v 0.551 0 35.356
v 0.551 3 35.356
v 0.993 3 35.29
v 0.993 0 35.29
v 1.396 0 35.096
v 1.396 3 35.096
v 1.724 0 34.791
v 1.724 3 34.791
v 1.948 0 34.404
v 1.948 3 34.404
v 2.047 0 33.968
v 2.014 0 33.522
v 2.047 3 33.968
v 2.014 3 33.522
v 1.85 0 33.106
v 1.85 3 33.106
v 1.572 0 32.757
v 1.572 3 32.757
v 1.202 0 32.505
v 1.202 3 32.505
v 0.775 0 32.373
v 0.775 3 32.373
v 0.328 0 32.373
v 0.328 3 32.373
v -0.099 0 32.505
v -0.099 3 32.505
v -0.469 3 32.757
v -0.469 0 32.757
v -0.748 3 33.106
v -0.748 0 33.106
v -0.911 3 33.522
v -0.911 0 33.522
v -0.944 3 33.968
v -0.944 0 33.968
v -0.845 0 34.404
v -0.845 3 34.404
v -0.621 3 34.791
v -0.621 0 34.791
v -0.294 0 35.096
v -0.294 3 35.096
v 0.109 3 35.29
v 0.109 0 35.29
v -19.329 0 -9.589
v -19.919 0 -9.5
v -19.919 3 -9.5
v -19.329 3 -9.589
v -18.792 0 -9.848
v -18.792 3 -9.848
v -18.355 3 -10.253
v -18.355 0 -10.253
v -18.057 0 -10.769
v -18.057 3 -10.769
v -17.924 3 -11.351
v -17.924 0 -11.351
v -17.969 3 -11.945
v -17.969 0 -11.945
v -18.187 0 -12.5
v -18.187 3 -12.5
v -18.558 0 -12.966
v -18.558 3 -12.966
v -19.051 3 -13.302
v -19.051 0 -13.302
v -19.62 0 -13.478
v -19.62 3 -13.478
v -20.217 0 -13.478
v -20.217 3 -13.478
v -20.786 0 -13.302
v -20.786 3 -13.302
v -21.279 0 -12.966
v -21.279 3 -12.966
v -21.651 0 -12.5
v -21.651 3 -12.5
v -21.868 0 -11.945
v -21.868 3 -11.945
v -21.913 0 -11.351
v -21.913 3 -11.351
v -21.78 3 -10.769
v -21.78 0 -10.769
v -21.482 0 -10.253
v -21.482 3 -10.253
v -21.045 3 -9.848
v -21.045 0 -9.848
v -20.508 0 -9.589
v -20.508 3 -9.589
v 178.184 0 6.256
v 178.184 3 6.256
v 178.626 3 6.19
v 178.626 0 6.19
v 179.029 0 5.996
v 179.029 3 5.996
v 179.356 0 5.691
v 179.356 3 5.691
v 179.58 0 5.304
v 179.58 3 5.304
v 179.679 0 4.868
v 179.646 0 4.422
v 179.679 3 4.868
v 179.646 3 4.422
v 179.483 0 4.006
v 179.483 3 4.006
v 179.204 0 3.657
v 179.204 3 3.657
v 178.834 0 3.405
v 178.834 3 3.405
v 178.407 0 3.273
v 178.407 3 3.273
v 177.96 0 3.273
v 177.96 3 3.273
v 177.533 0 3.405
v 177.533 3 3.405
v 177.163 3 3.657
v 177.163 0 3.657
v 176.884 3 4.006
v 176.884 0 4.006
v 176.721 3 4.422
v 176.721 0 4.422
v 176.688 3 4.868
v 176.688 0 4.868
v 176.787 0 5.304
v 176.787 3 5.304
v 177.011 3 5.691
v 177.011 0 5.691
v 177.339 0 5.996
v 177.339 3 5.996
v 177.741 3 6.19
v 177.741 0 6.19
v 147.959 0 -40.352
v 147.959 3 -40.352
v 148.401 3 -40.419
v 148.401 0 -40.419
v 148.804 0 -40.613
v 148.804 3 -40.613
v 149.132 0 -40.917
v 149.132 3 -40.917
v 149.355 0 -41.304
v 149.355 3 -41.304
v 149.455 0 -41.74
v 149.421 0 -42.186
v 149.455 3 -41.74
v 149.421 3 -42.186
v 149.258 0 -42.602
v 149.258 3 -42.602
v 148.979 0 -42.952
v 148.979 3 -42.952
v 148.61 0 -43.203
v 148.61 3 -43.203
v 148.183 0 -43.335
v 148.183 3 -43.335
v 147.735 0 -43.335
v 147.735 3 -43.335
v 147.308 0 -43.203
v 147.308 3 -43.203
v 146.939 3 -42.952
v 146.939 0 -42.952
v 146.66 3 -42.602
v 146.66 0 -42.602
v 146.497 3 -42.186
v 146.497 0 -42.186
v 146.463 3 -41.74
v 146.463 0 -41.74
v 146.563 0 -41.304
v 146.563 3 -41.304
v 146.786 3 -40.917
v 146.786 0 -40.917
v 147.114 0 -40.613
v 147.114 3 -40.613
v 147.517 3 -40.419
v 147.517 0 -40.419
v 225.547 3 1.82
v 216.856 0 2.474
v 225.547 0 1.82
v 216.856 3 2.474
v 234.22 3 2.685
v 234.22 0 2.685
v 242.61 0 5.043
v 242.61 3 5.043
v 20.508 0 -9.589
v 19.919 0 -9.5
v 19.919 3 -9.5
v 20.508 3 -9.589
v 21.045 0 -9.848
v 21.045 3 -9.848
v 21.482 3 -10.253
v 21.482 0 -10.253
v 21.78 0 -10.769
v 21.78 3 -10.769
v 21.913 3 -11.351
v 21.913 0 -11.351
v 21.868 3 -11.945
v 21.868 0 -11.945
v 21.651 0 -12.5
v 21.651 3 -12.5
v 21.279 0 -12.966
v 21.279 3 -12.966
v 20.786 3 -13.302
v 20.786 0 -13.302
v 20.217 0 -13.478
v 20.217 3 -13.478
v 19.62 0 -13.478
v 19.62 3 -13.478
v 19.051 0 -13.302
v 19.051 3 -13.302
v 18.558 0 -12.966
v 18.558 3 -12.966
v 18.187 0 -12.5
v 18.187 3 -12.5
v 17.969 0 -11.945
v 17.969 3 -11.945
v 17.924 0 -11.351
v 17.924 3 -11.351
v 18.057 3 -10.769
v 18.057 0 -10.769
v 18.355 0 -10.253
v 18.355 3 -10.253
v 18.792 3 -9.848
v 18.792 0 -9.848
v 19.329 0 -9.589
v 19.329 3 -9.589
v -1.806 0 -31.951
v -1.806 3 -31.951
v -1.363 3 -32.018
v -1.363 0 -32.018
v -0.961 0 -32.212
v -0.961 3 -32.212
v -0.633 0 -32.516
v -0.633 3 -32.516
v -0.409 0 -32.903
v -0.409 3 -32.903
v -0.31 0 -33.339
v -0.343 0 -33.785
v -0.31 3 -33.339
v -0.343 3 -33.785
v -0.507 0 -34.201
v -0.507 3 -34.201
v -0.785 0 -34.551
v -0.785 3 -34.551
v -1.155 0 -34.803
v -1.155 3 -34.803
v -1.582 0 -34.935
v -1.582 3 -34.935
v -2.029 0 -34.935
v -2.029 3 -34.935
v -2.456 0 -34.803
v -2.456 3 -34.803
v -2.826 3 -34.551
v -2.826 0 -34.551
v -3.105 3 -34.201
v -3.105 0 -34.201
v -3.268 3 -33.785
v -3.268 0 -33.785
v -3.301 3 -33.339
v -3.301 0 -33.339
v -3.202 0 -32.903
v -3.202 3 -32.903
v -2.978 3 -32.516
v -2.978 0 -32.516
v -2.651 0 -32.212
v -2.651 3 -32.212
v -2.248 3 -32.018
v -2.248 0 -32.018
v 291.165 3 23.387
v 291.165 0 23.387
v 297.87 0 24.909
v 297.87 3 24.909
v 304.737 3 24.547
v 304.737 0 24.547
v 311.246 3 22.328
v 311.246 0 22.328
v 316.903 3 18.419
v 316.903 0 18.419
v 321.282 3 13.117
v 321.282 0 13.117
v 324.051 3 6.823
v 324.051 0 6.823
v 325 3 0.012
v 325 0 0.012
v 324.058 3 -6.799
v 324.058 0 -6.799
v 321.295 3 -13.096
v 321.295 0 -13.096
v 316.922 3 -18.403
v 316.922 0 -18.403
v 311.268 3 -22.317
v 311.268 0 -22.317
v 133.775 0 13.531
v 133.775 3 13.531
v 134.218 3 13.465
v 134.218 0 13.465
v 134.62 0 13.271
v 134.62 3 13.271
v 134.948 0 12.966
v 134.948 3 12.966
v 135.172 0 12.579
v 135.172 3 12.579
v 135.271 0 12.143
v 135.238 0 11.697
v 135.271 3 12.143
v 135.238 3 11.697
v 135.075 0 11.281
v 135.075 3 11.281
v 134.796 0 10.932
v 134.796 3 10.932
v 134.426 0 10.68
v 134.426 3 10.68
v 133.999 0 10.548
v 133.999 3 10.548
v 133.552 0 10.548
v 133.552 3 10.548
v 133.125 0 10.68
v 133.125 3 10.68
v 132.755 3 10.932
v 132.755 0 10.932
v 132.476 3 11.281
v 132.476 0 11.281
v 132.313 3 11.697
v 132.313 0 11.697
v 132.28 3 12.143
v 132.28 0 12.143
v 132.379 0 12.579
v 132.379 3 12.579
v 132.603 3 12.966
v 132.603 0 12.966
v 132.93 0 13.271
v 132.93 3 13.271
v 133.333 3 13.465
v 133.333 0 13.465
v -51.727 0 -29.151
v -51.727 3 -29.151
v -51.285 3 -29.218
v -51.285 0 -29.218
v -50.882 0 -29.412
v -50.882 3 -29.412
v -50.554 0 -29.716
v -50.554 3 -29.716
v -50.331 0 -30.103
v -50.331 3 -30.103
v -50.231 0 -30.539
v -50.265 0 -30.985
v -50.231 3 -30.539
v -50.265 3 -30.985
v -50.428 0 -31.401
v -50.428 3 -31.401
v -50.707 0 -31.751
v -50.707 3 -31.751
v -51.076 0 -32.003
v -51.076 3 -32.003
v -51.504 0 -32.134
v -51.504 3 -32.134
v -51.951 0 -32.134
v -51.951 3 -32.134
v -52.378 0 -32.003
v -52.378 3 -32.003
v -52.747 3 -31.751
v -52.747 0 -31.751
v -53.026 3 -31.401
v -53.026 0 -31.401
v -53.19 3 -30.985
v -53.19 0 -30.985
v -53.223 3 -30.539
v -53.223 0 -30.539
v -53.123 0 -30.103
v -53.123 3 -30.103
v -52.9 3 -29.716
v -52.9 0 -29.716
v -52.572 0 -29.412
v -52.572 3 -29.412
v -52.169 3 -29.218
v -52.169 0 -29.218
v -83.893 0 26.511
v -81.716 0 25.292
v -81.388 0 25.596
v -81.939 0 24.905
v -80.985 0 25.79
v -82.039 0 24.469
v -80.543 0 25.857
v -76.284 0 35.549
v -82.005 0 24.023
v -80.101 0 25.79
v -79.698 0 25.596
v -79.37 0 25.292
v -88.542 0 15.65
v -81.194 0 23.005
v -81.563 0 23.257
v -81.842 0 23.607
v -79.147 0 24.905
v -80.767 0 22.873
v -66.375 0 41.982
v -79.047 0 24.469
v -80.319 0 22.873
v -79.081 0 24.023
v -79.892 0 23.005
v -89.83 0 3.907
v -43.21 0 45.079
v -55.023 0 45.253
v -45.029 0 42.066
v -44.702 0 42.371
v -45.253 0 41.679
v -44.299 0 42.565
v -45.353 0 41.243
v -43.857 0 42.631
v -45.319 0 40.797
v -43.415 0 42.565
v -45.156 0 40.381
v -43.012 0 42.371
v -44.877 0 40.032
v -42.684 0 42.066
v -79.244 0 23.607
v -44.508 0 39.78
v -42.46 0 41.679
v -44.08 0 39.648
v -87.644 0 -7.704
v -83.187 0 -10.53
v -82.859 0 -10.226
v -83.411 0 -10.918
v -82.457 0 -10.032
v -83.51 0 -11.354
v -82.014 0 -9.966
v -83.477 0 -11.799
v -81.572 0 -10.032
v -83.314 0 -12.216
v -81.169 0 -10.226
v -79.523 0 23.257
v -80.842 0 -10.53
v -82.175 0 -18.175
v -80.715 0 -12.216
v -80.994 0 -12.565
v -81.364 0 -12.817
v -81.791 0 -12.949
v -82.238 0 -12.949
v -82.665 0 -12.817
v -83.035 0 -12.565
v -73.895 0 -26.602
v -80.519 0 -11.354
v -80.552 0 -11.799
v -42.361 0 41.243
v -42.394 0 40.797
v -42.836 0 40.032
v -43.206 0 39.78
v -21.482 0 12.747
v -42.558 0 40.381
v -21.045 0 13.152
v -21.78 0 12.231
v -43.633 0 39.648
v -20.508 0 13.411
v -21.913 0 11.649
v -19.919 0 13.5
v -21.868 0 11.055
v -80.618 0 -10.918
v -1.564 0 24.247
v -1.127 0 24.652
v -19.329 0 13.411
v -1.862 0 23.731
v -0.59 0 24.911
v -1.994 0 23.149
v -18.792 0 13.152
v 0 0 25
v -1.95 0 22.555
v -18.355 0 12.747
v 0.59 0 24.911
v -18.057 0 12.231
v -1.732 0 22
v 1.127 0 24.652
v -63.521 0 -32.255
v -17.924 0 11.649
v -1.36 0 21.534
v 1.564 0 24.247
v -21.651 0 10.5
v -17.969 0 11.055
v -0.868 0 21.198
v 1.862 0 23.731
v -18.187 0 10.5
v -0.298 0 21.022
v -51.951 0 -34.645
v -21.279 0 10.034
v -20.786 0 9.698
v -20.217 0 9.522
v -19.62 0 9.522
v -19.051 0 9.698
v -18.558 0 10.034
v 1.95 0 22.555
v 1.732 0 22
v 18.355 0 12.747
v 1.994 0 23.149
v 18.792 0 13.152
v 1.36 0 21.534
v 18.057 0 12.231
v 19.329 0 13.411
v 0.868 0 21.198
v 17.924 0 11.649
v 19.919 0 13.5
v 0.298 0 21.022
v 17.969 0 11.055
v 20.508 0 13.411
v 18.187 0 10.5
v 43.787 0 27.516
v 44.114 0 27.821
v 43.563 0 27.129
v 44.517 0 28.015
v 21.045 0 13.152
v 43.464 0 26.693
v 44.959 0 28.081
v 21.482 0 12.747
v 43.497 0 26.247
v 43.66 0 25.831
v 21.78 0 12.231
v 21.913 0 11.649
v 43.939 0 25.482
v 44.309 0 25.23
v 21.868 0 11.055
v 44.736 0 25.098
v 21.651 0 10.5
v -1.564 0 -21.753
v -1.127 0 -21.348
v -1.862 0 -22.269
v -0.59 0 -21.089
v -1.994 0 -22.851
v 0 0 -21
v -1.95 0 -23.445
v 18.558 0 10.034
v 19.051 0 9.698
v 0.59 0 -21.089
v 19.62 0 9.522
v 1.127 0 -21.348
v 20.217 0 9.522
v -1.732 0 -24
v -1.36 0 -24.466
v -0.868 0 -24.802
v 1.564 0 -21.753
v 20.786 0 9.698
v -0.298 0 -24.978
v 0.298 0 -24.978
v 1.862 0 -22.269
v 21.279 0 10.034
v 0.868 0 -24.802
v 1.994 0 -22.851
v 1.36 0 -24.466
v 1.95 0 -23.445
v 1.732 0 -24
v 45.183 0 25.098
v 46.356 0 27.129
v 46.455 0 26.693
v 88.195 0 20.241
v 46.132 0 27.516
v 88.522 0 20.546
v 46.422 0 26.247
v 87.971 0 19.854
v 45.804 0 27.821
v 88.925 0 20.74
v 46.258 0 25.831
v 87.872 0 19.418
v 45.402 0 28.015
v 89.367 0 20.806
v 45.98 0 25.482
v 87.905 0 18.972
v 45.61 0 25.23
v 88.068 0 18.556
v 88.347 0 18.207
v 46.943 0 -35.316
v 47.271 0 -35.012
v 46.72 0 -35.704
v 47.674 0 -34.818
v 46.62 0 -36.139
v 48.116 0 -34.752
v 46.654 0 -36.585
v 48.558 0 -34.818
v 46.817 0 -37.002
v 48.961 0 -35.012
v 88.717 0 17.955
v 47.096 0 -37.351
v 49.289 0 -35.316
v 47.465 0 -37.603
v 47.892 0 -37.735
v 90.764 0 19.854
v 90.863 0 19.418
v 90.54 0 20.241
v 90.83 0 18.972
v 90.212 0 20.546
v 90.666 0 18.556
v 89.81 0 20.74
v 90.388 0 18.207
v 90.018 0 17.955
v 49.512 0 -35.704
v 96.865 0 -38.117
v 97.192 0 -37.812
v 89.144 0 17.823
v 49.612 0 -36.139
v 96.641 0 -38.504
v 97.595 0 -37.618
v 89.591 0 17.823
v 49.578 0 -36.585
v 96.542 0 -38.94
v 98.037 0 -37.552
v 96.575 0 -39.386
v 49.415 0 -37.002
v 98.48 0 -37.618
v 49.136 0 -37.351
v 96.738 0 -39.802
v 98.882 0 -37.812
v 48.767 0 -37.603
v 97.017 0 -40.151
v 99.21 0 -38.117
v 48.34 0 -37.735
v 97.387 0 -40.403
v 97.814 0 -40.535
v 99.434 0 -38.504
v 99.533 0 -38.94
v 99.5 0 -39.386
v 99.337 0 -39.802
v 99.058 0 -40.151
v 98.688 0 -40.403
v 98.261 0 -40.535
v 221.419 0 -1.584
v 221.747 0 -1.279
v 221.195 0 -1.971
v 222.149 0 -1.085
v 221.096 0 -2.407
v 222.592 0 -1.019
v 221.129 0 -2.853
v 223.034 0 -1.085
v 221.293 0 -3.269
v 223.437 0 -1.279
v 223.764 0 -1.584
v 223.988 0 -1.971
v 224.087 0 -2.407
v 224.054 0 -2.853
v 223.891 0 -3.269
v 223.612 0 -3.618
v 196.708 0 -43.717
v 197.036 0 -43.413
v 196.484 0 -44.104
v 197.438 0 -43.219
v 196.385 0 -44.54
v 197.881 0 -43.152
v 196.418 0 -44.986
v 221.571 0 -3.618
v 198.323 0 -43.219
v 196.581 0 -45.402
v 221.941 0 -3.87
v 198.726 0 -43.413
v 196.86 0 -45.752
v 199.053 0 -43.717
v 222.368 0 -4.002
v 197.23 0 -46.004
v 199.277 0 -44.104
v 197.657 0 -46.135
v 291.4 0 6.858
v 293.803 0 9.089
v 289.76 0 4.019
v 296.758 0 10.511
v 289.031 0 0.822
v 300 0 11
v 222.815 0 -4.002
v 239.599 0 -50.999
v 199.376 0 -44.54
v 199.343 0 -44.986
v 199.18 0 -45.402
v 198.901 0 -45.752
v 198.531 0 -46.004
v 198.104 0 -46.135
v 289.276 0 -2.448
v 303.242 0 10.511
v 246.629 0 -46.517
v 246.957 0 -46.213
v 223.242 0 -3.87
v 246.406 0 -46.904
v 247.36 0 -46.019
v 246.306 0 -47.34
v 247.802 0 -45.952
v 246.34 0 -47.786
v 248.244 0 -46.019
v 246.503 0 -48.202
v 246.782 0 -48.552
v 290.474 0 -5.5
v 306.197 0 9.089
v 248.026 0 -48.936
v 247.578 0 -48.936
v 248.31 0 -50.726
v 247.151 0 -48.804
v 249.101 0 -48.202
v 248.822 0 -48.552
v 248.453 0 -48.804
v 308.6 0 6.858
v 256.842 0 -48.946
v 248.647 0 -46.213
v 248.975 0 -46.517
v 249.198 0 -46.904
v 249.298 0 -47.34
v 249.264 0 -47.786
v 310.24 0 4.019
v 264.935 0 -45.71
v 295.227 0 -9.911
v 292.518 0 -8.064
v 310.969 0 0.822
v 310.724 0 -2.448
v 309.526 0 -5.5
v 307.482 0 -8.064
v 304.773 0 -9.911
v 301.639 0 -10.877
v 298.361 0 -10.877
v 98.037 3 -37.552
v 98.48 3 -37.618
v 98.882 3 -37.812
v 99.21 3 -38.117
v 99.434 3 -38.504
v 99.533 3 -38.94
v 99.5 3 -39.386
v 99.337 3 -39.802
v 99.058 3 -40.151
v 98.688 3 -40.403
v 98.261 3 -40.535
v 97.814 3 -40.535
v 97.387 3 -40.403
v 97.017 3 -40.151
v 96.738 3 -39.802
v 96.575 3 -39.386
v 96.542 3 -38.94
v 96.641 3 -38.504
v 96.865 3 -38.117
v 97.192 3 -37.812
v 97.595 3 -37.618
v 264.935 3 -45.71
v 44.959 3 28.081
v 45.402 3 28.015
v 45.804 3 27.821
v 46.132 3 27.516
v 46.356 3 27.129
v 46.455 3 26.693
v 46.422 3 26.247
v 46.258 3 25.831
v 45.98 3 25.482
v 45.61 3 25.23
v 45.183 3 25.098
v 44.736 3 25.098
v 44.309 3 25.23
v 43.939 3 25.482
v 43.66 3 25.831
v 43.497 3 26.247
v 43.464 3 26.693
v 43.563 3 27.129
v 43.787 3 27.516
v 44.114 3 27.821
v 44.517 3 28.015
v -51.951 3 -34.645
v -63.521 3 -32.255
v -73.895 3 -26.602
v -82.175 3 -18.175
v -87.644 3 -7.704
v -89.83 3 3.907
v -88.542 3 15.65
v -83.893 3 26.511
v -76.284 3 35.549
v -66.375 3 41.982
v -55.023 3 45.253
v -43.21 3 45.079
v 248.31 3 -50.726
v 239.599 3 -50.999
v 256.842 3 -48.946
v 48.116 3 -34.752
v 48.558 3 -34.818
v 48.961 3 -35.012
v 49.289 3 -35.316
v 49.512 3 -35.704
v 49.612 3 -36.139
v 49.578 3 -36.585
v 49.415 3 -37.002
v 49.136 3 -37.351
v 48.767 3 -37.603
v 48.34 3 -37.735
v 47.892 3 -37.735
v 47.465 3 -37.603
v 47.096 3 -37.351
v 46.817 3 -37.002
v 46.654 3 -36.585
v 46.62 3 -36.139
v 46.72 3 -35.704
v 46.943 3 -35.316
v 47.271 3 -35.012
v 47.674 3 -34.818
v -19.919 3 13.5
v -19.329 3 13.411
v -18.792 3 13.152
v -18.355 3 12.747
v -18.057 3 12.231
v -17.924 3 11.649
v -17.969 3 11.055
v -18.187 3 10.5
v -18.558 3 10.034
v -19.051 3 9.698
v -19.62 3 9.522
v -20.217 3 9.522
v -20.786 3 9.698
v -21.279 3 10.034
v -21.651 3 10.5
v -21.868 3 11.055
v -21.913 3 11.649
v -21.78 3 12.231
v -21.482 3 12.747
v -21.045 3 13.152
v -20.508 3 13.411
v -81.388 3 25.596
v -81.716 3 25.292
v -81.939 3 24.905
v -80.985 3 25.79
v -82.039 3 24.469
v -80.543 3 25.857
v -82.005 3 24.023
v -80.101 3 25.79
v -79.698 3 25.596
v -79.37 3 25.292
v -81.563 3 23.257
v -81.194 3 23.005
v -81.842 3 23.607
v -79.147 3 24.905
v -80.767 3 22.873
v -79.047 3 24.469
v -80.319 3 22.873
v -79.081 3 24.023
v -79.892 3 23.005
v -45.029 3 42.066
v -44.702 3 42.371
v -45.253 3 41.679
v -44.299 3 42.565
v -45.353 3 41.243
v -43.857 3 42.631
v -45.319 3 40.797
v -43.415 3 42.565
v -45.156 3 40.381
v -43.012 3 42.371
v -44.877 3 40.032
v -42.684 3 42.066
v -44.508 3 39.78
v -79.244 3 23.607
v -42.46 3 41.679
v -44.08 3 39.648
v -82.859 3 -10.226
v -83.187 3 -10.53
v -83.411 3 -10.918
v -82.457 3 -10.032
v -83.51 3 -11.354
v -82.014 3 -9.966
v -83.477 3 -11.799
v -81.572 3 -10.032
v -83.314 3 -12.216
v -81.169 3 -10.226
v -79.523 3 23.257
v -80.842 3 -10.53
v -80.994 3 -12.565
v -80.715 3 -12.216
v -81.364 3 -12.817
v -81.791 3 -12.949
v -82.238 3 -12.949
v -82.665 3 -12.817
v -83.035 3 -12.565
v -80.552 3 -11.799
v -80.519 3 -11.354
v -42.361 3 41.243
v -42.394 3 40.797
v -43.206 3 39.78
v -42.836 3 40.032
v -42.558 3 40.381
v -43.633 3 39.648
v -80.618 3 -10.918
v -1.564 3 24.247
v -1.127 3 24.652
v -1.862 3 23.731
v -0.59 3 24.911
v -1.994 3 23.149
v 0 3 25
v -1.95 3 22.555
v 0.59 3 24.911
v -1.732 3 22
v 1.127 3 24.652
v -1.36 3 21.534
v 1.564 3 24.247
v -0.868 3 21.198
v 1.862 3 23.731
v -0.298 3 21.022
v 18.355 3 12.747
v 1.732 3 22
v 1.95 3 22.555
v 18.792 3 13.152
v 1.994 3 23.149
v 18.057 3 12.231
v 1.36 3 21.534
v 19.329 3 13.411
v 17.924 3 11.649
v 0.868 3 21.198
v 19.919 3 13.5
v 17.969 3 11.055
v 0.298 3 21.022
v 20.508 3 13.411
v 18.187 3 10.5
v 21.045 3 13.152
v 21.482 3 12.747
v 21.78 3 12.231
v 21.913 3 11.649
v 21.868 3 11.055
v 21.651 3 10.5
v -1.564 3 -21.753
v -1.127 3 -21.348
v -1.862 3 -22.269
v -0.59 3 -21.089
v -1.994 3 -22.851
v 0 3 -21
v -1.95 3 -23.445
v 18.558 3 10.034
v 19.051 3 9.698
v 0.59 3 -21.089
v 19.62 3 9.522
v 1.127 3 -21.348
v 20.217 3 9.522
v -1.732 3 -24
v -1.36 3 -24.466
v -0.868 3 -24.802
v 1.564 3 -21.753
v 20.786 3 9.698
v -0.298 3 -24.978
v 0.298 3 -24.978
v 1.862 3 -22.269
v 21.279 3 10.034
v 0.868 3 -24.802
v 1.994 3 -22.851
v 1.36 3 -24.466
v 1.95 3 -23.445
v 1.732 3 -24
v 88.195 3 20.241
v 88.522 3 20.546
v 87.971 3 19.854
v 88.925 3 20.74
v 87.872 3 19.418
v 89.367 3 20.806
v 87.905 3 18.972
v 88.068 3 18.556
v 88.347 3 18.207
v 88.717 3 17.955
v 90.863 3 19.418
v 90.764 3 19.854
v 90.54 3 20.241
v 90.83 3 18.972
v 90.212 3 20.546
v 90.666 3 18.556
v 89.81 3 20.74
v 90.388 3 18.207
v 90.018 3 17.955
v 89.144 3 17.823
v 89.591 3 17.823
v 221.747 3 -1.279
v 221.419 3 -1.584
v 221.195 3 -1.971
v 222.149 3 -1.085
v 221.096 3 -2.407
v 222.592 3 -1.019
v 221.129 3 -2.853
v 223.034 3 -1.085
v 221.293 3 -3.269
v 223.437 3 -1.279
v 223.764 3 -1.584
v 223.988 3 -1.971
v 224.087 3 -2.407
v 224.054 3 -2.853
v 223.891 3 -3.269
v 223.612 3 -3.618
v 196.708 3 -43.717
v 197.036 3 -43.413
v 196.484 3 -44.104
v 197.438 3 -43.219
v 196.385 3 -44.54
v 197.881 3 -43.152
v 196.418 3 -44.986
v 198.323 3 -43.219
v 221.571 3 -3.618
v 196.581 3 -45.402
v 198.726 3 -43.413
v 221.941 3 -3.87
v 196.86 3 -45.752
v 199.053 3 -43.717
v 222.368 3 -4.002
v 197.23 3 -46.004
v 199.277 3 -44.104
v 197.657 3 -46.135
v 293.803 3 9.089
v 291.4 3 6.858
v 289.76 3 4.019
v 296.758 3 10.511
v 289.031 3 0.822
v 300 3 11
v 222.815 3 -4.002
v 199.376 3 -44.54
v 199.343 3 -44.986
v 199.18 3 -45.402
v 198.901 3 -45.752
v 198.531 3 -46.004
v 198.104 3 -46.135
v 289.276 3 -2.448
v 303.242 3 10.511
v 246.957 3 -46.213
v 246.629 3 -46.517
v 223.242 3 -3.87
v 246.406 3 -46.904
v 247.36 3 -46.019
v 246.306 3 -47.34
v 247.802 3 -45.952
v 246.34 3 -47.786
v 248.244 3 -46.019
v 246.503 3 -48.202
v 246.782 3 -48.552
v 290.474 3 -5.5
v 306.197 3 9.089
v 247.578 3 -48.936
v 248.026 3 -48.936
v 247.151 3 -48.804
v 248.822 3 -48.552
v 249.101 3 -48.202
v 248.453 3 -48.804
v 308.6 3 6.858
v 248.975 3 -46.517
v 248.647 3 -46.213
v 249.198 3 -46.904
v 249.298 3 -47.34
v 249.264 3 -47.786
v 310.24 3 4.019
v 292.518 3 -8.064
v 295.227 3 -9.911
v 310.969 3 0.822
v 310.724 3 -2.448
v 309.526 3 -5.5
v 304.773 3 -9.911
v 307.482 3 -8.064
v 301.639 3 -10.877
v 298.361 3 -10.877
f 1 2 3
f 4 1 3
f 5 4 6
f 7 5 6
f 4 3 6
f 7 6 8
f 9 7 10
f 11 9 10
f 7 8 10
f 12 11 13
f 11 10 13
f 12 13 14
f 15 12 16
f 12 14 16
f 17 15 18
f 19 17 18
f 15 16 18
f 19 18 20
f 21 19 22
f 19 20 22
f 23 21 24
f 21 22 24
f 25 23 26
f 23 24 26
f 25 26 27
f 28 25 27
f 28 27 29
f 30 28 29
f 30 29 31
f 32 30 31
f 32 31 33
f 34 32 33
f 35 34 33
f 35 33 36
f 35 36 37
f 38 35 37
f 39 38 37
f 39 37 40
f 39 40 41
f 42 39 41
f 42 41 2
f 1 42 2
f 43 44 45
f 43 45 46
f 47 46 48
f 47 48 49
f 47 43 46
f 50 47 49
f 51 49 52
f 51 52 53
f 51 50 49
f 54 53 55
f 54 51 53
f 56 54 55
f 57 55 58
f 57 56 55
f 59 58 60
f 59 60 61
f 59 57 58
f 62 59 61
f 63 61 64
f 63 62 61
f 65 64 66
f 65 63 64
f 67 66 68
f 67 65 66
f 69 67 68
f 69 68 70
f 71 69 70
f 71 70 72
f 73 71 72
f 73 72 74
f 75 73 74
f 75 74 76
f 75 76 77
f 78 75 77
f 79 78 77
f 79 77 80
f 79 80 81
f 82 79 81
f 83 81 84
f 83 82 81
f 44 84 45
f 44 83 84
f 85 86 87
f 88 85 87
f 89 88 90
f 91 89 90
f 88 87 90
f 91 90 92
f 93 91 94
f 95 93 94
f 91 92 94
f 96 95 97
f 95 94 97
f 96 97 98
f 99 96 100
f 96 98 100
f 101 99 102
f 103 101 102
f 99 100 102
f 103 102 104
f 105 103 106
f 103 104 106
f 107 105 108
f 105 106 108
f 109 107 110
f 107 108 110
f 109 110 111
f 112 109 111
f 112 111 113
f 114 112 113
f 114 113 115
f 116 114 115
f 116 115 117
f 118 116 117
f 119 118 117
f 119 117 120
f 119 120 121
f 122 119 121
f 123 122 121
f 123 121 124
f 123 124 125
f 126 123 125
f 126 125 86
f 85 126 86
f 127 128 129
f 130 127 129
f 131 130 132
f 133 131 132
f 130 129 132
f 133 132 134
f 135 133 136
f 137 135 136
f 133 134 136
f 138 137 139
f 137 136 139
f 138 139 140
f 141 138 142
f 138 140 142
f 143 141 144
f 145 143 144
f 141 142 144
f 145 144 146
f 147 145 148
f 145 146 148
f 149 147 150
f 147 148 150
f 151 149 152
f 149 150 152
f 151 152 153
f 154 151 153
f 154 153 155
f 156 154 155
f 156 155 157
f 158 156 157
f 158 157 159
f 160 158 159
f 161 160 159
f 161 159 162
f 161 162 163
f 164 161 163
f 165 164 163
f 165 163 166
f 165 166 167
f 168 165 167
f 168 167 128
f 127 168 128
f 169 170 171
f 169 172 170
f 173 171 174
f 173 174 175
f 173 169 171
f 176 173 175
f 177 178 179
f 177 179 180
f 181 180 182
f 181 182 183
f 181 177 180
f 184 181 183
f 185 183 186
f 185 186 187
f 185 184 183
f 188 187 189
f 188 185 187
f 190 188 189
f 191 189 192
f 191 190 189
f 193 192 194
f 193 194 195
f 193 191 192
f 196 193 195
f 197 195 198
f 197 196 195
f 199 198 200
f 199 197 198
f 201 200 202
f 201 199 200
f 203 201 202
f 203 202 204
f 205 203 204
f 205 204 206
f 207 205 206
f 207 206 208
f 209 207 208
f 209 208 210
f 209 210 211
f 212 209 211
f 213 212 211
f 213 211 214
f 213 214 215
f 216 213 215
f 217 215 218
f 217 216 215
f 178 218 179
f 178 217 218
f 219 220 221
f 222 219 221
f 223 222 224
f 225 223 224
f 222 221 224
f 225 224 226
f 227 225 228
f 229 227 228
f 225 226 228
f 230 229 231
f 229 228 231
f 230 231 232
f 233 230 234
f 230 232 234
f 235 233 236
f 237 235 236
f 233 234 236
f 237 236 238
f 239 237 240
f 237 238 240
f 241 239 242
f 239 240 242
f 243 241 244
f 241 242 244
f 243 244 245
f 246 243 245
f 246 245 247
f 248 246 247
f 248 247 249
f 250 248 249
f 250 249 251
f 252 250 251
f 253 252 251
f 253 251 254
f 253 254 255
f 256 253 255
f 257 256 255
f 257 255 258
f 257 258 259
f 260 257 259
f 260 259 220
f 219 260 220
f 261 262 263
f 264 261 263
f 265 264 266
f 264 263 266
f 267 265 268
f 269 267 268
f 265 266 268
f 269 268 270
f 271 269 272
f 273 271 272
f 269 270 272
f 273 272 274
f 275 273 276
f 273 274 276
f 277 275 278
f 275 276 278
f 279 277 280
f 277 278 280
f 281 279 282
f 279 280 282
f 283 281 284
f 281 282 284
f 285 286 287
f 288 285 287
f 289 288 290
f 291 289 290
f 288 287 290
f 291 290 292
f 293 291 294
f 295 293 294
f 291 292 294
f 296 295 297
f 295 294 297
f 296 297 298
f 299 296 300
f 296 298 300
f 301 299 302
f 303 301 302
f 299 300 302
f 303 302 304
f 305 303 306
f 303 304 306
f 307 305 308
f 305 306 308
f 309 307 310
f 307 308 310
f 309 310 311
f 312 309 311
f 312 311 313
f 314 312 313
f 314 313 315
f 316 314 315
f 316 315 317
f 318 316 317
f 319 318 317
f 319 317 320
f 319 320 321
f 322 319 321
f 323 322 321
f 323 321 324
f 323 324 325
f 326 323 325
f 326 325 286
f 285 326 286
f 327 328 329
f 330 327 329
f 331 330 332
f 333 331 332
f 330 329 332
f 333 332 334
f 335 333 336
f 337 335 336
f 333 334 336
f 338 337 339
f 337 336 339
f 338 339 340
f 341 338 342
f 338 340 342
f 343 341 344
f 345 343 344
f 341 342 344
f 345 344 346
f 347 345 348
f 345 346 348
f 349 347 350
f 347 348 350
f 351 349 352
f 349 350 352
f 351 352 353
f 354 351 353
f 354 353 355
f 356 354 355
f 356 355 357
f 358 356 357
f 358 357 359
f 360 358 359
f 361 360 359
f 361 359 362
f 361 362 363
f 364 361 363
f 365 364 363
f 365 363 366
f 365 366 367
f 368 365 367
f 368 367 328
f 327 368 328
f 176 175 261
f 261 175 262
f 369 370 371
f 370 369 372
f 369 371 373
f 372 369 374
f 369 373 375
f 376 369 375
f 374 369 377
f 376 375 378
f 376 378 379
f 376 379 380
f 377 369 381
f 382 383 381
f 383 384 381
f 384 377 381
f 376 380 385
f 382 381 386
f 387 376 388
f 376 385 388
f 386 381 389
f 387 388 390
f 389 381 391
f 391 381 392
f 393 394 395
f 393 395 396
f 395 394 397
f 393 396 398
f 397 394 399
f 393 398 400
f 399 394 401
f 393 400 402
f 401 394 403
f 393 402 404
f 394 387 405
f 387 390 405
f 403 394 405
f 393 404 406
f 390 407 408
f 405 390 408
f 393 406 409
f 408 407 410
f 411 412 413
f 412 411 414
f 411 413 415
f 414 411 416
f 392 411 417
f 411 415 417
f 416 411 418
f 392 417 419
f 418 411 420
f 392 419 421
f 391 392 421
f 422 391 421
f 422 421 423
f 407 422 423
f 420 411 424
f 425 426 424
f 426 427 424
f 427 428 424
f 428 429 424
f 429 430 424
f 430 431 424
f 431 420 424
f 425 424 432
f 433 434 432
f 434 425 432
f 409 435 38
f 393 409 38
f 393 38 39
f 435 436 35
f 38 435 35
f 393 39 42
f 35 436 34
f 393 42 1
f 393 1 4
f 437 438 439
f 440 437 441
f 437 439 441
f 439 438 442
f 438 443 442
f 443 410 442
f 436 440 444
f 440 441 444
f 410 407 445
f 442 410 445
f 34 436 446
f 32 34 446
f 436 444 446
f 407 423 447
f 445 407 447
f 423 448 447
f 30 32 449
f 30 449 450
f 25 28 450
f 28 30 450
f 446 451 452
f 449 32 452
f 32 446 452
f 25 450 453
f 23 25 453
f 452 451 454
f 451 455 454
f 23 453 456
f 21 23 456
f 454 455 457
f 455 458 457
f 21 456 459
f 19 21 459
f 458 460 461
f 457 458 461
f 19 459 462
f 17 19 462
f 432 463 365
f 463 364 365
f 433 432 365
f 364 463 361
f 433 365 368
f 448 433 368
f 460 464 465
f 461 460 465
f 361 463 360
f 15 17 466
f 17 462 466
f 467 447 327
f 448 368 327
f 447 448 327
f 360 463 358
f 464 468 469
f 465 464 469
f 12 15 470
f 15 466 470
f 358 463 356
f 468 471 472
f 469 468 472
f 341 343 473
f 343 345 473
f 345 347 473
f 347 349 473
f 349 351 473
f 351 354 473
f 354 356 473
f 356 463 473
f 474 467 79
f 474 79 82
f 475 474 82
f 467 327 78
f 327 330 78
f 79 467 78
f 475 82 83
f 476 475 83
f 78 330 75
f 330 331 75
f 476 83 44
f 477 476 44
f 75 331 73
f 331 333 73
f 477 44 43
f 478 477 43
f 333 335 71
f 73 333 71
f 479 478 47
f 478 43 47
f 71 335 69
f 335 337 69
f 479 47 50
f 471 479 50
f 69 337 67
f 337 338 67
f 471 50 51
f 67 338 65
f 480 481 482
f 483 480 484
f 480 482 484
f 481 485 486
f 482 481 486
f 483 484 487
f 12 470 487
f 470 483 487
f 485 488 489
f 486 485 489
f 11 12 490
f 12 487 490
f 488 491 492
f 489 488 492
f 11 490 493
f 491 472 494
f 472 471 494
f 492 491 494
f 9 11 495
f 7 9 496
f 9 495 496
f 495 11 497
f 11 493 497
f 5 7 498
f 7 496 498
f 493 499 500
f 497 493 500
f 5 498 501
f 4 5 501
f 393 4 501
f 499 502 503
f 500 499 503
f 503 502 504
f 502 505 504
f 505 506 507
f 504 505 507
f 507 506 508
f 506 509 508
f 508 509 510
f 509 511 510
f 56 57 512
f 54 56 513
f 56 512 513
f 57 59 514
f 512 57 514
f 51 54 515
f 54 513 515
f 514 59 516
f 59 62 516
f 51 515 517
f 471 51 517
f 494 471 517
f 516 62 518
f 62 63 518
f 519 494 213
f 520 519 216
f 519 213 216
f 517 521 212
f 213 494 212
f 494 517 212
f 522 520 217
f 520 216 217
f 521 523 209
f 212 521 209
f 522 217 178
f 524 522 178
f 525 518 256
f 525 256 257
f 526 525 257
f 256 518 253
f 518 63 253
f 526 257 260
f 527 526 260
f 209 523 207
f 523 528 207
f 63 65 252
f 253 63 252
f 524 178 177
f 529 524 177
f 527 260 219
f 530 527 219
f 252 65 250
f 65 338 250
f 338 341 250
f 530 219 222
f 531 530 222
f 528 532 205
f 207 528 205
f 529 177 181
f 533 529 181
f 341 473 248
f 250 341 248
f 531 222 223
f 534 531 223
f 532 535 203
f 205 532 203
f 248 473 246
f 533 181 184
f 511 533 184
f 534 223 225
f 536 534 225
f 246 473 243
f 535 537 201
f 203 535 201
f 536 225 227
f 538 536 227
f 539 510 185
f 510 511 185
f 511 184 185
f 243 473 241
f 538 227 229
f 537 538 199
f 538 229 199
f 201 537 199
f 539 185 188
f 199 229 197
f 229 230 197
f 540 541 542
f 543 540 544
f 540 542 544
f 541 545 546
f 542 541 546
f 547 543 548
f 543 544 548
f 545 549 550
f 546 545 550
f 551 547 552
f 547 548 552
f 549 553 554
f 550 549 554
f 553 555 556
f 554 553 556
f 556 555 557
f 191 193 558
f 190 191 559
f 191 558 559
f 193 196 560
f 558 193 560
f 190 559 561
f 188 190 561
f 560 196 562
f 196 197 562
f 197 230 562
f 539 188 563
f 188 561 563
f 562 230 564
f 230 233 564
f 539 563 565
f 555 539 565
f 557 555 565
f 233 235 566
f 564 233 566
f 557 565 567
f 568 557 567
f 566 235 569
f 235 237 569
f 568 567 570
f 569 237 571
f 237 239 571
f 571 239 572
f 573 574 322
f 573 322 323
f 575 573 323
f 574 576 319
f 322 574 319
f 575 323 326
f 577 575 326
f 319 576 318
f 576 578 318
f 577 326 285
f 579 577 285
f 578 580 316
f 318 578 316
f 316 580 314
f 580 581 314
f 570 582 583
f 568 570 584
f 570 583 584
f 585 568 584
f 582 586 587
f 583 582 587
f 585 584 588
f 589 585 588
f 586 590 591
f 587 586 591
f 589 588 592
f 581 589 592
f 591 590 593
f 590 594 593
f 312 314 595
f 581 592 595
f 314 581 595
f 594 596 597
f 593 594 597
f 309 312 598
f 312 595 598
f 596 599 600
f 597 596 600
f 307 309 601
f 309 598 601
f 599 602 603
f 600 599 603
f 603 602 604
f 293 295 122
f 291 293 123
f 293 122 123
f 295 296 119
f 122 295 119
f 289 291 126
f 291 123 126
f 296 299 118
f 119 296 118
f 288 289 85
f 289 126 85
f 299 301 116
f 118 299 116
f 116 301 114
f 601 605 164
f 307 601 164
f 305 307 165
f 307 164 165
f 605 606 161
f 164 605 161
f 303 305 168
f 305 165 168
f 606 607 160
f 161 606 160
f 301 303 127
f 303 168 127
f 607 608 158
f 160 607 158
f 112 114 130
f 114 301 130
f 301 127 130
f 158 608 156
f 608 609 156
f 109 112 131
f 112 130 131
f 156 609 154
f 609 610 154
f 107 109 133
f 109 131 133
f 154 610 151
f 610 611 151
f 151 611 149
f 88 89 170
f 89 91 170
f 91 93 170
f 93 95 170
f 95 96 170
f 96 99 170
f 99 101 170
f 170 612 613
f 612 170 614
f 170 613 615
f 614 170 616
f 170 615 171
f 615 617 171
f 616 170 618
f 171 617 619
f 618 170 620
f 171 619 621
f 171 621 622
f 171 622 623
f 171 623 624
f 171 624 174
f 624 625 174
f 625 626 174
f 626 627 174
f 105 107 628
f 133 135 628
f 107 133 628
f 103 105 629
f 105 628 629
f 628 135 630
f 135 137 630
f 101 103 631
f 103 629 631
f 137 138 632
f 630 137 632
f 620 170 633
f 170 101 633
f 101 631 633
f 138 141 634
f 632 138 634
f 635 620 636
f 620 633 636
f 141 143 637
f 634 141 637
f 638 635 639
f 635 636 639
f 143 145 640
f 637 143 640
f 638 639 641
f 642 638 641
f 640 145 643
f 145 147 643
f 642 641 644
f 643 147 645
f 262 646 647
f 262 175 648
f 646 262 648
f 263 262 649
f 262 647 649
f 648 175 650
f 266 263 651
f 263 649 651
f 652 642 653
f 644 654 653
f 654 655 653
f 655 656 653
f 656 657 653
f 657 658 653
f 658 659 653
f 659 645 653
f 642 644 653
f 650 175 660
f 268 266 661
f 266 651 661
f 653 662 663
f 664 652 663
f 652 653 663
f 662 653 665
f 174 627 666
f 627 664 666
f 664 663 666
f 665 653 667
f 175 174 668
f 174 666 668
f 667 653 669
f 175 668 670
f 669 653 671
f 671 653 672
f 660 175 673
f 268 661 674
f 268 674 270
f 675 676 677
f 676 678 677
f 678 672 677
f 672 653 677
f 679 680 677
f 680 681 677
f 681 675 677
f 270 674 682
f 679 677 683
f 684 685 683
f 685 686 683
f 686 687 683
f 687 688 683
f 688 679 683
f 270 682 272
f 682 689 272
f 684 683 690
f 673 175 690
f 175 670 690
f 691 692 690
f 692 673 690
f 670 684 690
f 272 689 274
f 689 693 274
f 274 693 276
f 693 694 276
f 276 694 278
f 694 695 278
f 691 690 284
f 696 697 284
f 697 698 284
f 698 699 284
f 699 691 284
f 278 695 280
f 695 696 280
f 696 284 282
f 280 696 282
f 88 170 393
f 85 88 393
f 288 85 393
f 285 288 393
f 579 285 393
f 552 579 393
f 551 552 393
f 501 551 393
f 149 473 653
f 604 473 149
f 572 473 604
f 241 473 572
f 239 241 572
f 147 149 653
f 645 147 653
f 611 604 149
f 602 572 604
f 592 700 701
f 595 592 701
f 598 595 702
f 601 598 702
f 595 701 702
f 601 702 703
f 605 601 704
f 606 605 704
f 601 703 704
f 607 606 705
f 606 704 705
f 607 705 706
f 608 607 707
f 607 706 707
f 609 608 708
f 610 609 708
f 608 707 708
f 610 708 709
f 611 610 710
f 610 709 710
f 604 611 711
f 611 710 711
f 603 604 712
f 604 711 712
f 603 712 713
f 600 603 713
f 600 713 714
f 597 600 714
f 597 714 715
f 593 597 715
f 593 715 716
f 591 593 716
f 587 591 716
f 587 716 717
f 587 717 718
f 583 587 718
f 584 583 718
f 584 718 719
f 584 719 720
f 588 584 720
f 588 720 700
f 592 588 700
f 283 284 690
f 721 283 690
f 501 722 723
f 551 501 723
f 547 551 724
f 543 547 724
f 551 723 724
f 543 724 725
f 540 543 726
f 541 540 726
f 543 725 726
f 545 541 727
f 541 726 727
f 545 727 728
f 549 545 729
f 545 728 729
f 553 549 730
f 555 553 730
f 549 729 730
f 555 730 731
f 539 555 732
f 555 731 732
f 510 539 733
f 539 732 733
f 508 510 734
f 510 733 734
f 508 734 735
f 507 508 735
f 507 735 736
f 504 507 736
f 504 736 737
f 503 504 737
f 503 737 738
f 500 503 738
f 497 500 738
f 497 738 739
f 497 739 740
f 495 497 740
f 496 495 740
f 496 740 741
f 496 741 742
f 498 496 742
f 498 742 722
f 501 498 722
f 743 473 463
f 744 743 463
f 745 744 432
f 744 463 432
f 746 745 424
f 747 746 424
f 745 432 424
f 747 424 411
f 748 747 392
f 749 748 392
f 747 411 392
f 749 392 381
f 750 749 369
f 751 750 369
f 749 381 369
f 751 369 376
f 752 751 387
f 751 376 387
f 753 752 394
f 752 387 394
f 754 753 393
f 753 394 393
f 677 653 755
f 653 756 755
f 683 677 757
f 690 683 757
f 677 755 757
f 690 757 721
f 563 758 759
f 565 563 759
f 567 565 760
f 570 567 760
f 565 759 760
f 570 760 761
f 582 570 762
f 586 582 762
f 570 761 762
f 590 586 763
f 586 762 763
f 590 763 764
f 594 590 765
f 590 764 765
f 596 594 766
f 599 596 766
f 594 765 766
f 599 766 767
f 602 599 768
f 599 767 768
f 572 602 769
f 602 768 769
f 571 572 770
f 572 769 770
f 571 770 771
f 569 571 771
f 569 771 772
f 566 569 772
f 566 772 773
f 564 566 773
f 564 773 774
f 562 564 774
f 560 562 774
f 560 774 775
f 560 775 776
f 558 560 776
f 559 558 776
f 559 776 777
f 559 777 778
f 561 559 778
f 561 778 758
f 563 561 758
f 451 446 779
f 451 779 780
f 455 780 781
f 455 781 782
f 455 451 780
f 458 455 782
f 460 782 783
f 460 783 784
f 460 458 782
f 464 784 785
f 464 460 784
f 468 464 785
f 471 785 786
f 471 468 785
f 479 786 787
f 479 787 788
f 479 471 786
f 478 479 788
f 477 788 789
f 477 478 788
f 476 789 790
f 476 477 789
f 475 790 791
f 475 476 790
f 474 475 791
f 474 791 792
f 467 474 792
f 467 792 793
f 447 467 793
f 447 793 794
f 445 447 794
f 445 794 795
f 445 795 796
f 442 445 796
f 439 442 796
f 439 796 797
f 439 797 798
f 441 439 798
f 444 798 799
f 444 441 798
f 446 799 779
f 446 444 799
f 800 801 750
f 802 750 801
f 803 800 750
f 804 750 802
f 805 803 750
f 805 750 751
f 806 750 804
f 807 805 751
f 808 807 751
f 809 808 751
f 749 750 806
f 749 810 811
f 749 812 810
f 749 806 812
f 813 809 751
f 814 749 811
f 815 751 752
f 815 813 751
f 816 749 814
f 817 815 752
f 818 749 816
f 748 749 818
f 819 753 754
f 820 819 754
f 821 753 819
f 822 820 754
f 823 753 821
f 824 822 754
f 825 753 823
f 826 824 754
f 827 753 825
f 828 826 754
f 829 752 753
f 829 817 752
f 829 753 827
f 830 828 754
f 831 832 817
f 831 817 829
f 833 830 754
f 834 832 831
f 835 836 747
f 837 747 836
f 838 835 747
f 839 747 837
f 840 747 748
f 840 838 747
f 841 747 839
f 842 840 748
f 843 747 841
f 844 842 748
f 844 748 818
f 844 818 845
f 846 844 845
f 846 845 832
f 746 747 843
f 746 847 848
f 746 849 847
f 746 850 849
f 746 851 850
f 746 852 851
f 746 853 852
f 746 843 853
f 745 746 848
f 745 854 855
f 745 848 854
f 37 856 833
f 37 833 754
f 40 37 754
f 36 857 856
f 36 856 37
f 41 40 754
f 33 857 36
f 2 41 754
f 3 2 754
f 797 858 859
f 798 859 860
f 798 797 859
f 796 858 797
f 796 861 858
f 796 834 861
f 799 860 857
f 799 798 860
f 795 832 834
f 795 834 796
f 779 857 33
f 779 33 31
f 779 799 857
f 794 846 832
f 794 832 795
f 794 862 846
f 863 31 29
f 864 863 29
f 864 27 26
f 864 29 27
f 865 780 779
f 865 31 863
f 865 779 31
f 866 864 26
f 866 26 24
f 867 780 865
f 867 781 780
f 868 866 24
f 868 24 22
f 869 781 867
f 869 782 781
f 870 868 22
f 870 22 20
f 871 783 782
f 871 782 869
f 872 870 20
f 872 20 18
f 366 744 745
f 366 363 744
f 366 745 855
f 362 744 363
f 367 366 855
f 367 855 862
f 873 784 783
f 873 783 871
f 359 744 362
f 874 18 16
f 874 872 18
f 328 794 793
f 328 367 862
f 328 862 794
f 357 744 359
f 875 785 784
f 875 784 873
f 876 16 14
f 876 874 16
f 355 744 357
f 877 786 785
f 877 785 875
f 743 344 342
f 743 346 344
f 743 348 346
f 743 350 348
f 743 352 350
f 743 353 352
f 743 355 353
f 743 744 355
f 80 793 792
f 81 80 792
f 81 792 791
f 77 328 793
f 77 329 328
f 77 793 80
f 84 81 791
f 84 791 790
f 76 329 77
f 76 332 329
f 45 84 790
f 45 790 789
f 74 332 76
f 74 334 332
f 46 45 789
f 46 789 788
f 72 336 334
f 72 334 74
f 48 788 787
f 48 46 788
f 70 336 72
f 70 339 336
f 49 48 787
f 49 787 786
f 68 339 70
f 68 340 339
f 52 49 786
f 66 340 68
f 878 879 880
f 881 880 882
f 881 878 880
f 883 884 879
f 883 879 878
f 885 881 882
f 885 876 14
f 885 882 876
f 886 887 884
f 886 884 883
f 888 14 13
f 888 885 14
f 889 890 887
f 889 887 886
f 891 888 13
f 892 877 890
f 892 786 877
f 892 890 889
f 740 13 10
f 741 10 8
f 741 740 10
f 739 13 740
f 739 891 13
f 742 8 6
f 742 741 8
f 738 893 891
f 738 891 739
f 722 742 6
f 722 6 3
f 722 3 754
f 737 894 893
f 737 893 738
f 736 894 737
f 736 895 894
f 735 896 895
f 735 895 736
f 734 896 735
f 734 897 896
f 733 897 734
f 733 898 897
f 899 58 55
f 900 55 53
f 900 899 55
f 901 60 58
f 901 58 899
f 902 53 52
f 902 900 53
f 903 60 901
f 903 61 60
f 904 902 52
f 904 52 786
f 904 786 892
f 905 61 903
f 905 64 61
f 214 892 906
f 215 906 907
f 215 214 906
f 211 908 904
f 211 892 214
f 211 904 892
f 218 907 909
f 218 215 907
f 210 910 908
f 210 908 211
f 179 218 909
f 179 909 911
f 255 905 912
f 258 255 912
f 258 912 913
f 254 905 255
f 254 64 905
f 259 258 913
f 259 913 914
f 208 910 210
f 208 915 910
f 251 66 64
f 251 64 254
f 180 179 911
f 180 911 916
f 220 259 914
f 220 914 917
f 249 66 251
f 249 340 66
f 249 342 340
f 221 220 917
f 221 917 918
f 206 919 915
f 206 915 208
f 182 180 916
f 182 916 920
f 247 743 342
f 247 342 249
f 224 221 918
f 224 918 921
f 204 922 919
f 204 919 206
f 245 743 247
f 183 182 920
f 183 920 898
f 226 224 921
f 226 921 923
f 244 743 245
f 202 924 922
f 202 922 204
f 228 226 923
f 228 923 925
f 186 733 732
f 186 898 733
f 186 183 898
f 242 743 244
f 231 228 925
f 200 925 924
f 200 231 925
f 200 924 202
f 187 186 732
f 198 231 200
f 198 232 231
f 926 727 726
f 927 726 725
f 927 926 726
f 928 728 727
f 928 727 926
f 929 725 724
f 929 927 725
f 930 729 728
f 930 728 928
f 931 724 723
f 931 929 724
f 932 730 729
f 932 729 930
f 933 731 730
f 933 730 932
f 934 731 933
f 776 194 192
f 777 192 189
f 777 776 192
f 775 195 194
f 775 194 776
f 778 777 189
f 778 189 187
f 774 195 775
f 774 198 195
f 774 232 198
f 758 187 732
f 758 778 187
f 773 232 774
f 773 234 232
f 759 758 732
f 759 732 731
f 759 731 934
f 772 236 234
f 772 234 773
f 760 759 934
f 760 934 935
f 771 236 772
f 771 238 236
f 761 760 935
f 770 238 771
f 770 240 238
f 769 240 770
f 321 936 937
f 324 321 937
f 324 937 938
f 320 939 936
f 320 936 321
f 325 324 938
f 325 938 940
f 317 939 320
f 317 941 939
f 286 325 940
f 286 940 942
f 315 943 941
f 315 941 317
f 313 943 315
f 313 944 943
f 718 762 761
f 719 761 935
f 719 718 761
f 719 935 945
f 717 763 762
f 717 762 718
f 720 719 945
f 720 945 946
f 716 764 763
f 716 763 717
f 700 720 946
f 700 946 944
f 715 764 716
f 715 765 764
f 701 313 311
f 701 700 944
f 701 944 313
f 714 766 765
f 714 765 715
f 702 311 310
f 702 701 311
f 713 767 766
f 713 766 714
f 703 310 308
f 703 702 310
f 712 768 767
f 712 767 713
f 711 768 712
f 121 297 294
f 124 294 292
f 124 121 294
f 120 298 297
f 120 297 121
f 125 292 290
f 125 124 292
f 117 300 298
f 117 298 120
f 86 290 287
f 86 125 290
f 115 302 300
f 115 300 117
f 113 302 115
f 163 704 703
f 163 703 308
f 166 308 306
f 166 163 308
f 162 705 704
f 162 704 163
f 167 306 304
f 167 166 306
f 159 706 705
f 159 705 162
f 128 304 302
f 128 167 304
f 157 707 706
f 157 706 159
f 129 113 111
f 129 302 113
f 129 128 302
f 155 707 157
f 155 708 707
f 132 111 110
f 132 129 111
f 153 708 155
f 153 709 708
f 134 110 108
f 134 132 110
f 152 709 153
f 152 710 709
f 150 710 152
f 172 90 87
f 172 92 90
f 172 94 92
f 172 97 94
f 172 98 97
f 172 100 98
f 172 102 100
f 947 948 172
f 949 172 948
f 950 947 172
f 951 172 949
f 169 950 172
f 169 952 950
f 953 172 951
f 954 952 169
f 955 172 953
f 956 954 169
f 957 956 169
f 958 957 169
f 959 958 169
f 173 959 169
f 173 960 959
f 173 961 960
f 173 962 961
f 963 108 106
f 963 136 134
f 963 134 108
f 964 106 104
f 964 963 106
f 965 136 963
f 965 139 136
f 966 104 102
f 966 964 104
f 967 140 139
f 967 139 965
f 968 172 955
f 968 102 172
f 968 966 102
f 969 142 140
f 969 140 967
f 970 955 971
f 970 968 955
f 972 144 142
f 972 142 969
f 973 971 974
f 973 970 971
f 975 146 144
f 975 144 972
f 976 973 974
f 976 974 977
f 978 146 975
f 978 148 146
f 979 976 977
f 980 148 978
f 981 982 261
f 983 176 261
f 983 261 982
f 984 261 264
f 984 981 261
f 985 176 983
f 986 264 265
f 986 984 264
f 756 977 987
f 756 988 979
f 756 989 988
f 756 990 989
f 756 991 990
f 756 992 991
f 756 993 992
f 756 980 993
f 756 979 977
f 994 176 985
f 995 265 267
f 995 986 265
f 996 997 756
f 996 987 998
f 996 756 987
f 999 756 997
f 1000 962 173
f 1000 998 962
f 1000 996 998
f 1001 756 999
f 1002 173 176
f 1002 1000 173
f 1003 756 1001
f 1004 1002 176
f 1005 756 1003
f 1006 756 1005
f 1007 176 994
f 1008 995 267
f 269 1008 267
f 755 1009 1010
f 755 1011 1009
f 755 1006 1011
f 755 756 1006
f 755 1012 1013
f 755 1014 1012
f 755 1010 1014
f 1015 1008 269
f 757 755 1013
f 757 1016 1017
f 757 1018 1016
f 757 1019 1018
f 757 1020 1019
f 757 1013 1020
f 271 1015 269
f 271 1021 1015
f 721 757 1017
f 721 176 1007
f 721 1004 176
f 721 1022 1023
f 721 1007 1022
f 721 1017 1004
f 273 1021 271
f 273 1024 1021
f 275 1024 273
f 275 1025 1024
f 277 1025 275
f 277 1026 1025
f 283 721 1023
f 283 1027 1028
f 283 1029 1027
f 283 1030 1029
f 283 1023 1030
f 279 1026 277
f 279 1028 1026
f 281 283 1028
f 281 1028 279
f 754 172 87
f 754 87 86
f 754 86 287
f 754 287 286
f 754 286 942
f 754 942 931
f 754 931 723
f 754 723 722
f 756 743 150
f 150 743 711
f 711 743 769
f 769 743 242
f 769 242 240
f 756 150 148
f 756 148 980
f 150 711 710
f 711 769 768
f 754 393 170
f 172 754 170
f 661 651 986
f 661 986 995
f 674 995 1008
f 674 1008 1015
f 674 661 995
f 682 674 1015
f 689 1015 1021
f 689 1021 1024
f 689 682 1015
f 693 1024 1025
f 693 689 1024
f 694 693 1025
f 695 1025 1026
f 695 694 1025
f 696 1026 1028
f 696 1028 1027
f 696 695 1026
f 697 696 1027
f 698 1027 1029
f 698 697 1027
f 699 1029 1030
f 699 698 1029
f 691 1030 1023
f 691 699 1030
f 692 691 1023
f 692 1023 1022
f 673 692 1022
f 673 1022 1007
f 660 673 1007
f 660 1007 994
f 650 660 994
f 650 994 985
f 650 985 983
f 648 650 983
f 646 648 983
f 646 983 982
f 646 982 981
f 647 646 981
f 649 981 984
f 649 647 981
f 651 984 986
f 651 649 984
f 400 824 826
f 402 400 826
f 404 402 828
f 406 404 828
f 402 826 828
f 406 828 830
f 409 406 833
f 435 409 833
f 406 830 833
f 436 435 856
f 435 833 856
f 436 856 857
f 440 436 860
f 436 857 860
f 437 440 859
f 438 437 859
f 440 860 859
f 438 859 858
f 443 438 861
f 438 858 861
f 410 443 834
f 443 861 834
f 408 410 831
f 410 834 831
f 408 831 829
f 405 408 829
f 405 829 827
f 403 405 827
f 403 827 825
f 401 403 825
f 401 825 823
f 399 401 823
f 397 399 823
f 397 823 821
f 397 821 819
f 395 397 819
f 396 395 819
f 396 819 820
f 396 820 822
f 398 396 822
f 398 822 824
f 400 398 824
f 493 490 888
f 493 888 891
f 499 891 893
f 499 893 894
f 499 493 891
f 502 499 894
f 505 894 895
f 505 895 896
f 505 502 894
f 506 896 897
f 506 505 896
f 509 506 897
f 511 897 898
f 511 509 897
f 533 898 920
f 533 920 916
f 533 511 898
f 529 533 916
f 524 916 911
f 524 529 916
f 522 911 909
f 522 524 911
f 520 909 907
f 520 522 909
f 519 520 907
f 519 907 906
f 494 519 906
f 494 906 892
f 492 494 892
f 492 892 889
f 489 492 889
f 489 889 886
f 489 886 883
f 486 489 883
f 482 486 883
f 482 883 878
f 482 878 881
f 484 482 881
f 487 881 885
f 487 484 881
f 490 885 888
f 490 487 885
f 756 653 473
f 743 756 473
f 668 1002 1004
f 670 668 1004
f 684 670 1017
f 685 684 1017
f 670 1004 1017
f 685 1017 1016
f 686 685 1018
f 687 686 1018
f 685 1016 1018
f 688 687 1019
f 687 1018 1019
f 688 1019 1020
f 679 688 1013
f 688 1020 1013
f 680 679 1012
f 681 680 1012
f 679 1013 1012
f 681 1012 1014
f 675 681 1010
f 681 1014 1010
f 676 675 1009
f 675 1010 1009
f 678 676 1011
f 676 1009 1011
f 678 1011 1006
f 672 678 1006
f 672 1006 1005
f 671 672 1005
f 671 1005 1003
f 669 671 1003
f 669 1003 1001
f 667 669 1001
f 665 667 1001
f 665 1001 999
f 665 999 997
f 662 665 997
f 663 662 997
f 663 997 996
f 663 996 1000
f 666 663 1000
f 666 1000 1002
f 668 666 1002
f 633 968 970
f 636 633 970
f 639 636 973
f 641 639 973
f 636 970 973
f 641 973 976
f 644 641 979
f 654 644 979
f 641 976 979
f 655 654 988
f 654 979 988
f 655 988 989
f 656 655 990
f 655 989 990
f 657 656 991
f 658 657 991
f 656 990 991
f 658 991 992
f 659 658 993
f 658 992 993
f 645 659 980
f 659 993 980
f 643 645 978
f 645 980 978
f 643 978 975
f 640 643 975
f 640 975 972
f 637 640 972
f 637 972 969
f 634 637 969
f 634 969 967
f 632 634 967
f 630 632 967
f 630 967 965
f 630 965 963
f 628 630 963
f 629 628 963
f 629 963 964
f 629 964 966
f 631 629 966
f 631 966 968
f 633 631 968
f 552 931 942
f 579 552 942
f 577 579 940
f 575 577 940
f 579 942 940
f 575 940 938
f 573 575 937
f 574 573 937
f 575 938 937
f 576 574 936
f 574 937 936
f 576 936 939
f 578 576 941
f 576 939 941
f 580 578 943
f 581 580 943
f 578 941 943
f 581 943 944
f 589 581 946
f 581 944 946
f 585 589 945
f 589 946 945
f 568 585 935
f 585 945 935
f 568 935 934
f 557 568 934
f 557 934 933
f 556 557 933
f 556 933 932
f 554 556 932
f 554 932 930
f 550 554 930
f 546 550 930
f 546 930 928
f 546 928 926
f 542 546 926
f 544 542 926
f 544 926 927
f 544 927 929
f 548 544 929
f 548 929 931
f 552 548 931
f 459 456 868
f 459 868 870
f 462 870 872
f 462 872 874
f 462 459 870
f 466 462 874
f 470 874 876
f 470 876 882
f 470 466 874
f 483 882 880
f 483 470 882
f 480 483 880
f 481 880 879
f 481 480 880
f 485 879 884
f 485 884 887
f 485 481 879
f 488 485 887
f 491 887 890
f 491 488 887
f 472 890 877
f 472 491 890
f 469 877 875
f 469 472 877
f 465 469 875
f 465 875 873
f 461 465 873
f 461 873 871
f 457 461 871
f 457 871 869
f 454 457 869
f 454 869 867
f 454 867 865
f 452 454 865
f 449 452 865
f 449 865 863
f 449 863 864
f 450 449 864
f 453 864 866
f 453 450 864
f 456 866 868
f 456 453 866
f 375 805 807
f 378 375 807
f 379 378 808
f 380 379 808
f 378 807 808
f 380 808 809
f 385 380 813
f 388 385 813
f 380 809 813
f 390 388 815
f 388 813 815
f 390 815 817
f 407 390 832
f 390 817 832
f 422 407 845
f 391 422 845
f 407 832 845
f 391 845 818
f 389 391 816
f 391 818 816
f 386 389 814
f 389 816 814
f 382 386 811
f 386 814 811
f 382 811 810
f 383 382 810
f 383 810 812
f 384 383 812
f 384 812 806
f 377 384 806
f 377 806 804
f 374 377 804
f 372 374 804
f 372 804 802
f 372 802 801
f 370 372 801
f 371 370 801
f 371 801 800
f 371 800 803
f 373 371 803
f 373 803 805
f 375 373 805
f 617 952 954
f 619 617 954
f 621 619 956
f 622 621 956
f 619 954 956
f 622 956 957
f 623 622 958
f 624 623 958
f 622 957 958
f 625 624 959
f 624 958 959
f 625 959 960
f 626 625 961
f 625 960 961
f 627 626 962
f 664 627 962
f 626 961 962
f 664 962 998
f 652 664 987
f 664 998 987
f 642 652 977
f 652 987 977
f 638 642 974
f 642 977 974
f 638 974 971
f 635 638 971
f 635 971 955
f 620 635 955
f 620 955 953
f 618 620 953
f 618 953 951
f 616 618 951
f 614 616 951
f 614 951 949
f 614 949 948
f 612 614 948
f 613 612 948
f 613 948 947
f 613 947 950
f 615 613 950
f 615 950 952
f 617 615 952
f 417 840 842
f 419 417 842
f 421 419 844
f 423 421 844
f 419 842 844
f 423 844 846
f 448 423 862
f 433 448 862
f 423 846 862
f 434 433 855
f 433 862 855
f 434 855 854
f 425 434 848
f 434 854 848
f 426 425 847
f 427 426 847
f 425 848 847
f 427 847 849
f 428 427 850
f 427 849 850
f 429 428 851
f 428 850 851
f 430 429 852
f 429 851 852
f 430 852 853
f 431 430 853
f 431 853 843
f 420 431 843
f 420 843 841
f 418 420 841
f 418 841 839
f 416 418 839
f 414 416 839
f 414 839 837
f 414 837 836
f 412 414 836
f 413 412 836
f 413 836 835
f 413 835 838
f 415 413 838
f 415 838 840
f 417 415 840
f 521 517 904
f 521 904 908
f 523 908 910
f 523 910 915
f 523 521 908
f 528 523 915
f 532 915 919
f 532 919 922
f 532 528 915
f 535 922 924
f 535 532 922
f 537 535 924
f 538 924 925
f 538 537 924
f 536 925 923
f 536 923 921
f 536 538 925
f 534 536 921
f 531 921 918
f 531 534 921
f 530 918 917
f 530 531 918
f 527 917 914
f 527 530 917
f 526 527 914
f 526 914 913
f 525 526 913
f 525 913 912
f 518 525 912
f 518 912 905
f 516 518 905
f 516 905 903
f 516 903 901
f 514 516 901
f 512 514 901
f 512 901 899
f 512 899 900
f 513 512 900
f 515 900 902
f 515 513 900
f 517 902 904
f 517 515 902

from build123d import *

# Parameters (mm, degrees)
SKETCH1_R           = 2
SKETCH1_R_2         = 11
BOSS_EXTRUDE2_DEPTH = 3
FILLET1_R           = 50
SKETCH2_R           = 1.5
CUT_EXTRUDE1_DEPTH  = 10


with BuildPart() as part:
    # Sketch1 → Boss-Extrude2 (new body)
    with BuildSketch(Plane(origin=(0, 0, 0), x_dir=(1, 0, 0), z_dir=(0, 1, 0))):
        with BuildLine():
            Line((-43.210033531, -45.078612162), (230.077464987, -0.308197366))
            Line((230.077464987, -0.308197366), (291.16461822, -23.386663481))
            ThreePointArc((291.16461822, -23.386663481), (322.884028765, -10.065844598), (311.267854408, 22.316708024))
            Line((311.267854408, 22.316708024), (252.97547919, 51.748916229))
            Line((252.97547919, 51.748916229), (-51.951129031, 34.644890888))
            ThreePointArc((-51.951129031, 34.644890888), (-89.620314745, -9.826208081), (-43.210033531, -45.078612162))
        make_face()
        with Locations(Location((19.918584287, -11.5, 0), (0, 0, 270))):
            Circle(SKETCH1_R, mode=Mode.SUBTRACT)
        with Locations(Location((0, -23, 0), (0, 0, 270))):
            Circle(SKETCH1_R, mode=Mode.SUBTRACT)
        with Locations(Location((-19.918584287, -11.5, 0), (0, 0, 270))):
            Circle(SKETCH1_R, mode=Mode.SUBTRACT)
        with Locations(Location((-19.918584287, 11.5, 0), (0, 0, 270))):
            Circle(SKETCH1_R, mode=Mode.SUBTRACT)
        with Locations(Location((0, 23, 0), (0, 0, 270))):
            Circle(SKETCH1_R, mode=Mode.SUBTRACT)
        with Locations(Location((19.918584287, 11.5, 0), (0, 0, 270))):
            Circle(SKETCH1_R, mode=Mode.SUBTRACT)
        with Locations(Location((300, 0, 0), (0, 0, 270))):
            Circle(SKETCH1_R_2, mode=Mode.SUBTRACT)
    extrude(amount=BOSS_EXTRUDE2_DEPTH)

    # Fillet1
    fillet1_edges = [part.edges().sort_by_distance(p)[0] for p in [
        (252.97547919, 1.5, -51.748916229),
        (230.077464987, 1.5, 0.308197366),
    ]]
    fillet(fillet1_edges, radius=FILLET1_R)

    # Sketch2 → Cut-Extrude1 (cut)
    with BuildSketch(Plane(origin=(0, 3, 0), x_dir=(1, 0, 0), z_dir=(0, 1, 0))):
        with Locations(Location((-51.727112095, 30.651168763, 0), (0, 0, 270))):
            Circle(SKETCH2_R)
        with Locations(Location((-43.856700198, -41.13123047, 0), (0, 0, 270))):
            Circle(SKETCH2_R)
        with Locations(Location((-80.543038085, -24.356685052, 0), (0, 0, 270))):
            Circle(SKETCH2_R)
        with Locations(Location((-82.014474694, 11.465683169, 0), (0, 0, 270))):
            Circle(SKETCH2_R)
        with Locations(Location((-1.805585532, 33.451380461, 0), (0, 0, 270))):
            Circle(SKETCH2_R)
        with Locations(Location((48.115941032, 36.251592159, 0), (0, 0, 270))):
            Circle(SKETCH2_R)
        with Locations(Location((98.037467596, 39.051803857, 0), (0, 0, 270))):
            Circle(SKETCH2_R)
        with Locations(Location((147.958994159, 41.852015556, 0), (0, 0, 270))):
            Circle(SKETCH2_R)
        with Locations(Location((197.880520723, 44.652227254, 0), (0, 0, 270))):
            Circle(SKETCH2_R)
        with Locations(Location((247.802047287, 47.452438952, 0), (0, 0, 270))):
            Circle(SKETCH2_R)
        with Locations(Location((0.551343837, -33.85623047, 0), (0, 0, 270))):
            Circle(SKETCH2_R)
        with Locations(Location((44.959387872, -26.58123047, 0), (0, 0, 270))):
            Circle(SKETCH2_R)
        with Locations(Location((89.367431907, -19.30623047, 0), (0, 0, 270))):
            Circle(SKETCH2_R)
        with Locations(Location((133.775475942, -12.03123047, 0), (0, 0, 270))):
            Circle(SKETCH2_R)
        with Locations(Location((178.183519977, -4.75623047, 0), (0, 0, 270))):
            Circle(SKETCH2_R)
        with Locations(Location((222.591564011, 2.51876953, 0), (0, 0, 270))):
            Circle(SKETCH2_R)
    extrude(amount=-CUT_EXTRUDE1_DEPTH, mode=Mode.SUBTRACT)


solid = part.part
